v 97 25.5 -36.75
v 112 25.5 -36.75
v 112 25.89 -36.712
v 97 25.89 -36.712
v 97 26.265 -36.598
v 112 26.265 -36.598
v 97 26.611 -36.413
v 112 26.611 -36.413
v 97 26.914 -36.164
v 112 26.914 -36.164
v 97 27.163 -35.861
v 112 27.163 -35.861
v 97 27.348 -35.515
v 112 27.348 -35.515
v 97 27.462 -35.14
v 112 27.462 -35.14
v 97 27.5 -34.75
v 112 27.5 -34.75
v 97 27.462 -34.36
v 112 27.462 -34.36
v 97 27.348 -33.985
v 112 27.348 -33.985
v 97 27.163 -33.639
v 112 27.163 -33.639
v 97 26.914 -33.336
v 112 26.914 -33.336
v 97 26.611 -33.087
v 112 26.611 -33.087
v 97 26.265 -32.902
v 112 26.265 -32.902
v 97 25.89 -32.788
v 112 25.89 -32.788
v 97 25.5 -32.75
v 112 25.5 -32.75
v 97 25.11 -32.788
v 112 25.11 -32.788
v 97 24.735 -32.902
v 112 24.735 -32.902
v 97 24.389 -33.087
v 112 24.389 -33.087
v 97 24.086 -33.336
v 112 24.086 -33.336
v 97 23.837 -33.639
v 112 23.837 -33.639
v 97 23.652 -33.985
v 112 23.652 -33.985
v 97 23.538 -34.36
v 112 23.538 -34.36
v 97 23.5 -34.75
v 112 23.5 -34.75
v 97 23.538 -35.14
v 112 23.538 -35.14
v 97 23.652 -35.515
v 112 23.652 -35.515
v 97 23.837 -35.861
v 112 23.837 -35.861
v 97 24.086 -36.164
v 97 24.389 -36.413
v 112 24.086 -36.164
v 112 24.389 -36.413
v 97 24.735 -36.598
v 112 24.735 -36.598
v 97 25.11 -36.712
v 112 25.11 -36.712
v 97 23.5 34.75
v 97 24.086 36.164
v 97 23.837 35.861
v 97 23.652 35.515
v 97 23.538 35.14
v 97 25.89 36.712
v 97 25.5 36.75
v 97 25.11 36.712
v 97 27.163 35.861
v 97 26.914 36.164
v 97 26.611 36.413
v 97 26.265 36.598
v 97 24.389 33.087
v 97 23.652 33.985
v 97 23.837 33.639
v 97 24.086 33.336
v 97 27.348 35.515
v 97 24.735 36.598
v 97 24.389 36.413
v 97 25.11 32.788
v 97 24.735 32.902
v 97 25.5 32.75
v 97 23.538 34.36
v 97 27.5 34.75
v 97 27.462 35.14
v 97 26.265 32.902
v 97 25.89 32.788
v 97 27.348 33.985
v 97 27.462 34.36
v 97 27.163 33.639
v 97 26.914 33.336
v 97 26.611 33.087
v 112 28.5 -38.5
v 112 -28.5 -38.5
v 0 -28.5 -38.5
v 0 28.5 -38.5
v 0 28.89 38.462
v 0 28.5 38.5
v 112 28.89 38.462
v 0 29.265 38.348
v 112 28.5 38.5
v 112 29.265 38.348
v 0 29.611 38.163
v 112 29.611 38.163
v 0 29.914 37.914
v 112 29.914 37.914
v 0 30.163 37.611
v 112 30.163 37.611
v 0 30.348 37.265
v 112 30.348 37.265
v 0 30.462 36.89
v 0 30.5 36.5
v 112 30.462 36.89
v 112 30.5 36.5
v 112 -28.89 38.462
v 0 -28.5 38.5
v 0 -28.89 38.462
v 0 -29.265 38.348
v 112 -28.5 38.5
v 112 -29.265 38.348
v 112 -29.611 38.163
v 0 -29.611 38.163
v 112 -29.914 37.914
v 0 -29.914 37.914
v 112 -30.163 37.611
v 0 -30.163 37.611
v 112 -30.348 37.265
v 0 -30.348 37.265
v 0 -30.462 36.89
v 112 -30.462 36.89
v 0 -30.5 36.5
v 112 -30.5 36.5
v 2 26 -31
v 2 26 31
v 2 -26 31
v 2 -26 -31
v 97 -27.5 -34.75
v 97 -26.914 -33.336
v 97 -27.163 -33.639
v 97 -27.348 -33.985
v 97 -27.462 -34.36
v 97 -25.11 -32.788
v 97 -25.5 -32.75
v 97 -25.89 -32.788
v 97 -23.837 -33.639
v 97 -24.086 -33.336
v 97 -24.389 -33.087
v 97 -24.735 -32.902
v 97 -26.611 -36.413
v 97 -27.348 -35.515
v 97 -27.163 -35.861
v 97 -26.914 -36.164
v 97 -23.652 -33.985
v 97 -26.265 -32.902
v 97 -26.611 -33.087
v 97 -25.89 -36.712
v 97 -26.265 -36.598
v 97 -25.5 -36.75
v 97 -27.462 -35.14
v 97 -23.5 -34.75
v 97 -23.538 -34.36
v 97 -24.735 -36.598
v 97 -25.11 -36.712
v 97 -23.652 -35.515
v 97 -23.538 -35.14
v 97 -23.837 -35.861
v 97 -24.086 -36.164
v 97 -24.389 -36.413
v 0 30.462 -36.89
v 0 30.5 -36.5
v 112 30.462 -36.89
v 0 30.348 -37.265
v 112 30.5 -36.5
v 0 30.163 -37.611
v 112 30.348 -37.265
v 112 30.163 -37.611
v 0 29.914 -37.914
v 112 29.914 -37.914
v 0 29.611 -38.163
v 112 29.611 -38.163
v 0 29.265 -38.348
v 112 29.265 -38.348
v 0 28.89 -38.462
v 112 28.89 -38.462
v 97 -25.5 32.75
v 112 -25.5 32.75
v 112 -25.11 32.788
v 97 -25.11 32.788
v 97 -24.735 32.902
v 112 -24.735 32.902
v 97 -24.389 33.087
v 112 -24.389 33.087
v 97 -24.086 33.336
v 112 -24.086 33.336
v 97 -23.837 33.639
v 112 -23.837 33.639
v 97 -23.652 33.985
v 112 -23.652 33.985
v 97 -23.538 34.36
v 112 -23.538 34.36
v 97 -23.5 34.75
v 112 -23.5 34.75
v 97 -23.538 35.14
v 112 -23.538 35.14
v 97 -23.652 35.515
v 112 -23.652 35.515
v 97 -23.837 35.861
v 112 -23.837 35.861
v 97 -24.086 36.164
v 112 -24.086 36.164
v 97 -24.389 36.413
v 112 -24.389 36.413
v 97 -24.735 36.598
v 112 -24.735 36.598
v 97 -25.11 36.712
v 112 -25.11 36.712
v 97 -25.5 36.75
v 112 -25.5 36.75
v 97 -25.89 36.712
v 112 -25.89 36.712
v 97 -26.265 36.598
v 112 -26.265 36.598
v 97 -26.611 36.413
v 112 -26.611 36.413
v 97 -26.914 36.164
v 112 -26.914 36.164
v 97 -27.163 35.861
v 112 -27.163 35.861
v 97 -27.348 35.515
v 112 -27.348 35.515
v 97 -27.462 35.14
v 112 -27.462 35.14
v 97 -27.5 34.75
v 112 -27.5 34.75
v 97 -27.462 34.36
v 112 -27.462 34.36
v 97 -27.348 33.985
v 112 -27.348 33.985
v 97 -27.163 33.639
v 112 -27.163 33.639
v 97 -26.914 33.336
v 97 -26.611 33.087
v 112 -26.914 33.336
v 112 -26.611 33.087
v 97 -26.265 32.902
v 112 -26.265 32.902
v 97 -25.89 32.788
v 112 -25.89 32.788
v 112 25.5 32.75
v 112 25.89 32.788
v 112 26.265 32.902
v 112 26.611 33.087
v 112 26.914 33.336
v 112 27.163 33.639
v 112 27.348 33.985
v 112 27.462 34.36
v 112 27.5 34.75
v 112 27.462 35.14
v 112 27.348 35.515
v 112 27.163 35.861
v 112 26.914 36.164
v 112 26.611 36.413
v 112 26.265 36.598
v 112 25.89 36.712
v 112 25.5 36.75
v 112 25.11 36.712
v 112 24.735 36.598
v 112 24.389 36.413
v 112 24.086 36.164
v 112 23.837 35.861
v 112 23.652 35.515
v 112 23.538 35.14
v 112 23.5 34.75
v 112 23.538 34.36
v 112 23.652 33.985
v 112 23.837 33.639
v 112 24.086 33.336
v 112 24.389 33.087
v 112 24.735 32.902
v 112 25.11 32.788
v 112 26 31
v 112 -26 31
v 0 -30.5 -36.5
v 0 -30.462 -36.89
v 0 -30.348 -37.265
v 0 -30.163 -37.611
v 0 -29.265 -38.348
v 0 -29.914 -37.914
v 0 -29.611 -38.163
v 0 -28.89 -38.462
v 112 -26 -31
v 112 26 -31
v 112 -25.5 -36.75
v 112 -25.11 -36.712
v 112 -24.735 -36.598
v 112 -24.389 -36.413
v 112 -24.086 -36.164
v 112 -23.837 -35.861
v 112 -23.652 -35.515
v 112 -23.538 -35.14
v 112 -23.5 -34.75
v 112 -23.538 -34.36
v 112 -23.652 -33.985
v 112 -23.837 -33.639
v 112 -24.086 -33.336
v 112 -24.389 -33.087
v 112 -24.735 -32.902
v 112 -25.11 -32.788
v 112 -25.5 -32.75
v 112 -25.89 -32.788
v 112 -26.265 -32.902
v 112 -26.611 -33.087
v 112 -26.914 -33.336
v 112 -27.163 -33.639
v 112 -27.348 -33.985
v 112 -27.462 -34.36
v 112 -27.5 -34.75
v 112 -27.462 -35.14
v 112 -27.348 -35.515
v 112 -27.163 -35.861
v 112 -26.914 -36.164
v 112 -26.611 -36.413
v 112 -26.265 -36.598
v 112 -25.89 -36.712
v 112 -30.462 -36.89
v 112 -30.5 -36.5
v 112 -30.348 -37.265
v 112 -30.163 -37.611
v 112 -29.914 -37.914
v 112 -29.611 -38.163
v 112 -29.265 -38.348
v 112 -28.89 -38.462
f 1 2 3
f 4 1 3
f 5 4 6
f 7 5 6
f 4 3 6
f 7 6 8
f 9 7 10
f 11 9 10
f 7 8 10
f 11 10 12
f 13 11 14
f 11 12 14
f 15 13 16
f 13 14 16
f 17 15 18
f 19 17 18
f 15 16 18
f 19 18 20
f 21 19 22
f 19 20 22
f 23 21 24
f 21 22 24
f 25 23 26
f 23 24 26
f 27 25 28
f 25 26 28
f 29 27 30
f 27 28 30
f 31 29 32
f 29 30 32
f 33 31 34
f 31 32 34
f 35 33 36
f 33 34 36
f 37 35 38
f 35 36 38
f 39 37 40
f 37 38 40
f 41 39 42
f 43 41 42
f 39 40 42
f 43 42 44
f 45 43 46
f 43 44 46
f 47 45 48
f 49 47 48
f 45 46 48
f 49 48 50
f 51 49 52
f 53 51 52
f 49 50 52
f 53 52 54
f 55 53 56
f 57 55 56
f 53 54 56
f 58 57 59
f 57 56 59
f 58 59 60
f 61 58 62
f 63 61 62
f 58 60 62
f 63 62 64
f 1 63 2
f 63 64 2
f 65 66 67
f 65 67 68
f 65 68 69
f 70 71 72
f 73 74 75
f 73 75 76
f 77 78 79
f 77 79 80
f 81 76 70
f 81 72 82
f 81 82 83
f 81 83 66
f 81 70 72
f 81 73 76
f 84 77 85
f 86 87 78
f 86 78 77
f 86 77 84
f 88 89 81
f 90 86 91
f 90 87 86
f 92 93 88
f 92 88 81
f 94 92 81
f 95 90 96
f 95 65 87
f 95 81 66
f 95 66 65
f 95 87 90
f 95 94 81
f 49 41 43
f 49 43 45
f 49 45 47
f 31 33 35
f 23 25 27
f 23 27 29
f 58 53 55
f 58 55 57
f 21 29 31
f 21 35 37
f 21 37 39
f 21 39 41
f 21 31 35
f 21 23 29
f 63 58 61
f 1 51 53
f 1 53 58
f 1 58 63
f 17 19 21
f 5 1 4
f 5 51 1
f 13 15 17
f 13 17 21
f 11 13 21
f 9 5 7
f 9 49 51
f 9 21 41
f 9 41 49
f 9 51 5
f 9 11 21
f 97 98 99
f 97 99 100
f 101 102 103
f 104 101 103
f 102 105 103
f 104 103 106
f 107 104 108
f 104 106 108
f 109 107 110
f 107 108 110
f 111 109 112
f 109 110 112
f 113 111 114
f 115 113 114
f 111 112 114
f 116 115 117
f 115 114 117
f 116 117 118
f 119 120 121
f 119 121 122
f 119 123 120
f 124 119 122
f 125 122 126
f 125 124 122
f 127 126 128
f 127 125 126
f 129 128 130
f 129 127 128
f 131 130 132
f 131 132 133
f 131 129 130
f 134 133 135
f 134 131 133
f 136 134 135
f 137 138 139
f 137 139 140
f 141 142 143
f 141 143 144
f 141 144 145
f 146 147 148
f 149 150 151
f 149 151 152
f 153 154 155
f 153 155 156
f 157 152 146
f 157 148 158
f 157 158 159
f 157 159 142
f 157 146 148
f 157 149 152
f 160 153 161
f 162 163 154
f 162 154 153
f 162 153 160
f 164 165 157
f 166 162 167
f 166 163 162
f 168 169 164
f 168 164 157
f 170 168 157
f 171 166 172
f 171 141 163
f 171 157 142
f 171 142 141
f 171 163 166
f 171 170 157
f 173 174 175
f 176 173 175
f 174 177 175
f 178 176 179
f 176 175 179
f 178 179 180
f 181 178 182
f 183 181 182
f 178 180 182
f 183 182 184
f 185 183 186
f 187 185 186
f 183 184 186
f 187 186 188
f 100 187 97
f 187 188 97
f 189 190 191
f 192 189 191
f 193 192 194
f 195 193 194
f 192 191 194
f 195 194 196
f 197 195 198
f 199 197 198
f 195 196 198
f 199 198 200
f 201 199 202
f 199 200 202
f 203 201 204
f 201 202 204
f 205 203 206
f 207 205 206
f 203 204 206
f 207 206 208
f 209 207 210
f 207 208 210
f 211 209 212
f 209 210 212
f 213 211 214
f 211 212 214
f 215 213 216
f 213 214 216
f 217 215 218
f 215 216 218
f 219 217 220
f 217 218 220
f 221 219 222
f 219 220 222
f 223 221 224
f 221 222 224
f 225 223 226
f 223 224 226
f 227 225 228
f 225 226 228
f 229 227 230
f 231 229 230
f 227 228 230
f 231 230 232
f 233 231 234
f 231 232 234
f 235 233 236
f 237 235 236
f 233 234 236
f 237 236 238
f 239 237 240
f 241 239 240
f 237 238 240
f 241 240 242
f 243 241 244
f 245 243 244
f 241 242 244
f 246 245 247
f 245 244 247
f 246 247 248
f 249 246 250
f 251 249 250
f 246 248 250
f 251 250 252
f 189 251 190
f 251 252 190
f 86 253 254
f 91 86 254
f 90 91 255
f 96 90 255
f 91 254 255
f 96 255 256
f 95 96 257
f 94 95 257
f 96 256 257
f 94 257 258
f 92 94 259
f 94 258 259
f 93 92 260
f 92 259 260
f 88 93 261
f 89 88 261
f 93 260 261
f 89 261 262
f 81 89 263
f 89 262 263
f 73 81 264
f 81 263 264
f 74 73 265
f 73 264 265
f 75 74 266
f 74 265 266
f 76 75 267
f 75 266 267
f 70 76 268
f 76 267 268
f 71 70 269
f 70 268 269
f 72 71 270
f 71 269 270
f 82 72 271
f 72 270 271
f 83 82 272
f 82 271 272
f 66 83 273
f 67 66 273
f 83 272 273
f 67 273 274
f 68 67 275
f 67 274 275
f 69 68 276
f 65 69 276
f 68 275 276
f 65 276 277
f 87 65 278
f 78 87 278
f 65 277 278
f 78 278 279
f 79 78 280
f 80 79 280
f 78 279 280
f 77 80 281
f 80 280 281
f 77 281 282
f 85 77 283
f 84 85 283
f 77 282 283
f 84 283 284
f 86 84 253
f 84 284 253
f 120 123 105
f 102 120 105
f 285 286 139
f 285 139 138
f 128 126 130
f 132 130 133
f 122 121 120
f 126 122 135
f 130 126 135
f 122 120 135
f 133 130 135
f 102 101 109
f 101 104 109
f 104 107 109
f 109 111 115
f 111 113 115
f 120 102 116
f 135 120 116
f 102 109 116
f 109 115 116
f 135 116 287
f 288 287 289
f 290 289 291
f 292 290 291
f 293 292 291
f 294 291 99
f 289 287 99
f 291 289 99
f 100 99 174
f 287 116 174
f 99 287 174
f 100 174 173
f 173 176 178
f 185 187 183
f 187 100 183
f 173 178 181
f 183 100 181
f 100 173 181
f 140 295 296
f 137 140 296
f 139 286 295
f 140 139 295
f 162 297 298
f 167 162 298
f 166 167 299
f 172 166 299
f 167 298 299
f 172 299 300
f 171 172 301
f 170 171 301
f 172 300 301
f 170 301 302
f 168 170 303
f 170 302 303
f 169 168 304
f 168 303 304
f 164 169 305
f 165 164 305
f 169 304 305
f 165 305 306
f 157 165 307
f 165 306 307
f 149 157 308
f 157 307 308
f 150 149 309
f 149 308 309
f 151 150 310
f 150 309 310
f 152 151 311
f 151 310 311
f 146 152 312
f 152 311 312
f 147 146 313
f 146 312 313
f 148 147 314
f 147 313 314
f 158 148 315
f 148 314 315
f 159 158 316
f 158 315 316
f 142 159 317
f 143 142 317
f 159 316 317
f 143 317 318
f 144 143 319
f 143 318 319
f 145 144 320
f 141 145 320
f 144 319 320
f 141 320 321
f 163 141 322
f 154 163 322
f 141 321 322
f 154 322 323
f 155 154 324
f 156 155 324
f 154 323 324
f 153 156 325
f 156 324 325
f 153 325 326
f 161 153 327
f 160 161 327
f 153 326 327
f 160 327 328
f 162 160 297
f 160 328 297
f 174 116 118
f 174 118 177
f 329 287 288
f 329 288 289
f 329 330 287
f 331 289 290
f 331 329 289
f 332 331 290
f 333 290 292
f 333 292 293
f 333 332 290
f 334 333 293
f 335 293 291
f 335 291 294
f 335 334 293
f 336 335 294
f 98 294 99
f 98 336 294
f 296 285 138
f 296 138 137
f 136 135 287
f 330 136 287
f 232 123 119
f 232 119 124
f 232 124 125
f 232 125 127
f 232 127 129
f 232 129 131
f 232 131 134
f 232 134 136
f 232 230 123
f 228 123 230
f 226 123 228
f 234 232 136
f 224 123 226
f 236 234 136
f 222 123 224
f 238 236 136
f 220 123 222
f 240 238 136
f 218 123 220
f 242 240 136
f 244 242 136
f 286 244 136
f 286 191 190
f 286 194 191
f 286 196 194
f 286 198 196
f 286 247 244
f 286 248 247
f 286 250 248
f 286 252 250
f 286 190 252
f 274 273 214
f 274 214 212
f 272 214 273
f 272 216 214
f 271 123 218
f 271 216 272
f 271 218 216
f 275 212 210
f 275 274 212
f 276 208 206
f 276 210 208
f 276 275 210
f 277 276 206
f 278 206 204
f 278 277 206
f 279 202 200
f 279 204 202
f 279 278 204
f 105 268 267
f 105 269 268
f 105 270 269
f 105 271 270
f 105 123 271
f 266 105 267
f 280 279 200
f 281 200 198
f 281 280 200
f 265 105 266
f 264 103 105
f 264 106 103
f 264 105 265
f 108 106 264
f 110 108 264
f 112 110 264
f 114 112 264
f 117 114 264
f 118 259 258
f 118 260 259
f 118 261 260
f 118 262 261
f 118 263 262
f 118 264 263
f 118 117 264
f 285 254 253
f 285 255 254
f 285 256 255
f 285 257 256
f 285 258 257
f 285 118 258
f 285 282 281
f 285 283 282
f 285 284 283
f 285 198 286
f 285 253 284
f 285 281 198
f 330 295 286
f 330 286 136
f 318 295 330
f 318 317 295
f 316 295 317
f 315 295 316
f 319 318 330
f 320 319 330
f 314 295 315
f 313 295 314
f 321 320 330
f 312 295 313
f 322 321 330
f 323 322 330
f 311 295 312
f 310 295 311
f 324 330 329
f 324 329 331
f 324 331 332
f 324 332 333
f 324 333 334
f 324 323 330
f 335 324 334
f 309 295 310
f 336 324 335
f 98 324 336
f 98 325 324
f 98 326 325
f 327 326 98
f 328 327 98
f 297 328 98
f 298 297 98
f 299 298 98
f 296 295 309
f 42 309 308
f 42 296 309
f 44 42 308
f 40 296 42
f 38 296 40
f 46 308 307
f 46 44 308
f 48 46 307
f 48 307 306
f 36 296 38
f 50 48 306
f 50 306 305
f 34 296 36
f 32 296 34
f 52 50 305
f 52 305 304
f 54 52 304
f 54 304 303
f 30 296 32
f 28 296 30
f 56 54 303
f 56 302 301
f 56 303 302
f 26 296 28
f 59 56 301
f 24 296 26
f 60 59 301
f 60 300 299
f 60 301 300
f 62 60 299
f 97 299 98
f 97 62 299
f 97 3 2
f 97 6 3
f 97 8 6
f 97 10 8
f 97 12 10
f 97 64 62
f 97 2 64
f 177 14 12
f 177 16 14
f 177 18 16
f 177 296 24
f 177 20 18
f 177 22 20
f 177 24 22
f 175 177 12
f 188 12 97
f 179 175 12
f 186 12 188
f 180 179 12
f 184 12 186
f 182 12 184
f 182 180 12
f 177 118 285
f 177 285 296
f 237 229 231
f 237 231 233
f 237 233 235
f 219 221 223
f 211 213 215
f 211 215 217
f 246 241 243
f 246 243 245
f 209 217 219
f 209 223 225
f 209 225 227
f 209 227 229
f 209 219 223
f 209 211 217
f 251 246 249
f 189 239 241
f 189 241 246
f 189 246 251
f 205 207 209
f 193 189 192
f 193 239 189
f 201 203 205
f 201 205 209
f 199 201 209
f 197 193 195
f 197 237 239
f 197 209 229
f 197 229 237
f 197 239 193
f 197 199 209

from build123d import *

# Parameters (mm, degrees)
CROQUIS1_W              = 77
CROQUIS1_H              = 61
SALIENTE_EXTRUIR1_DEPTH = 112
CROQUIS3_W              = 62
CROQUIS3_H              = 52
CORTAR_EXTRUIR4_DEPTH   = 110
CROQUIS10_R             = 2
CORTAR_EXTRUIR5_DEPTH   = 15
REDONDEO1_R             = 2
REDONDEO2_R             = 2


with BuildPart() as part:
    # Croquis1 → Saliente-Extruir1 (new body)
    with BuildSketch(Plane(origin=(0, 0, 0), x_dir=(0, 0, -1), z_dir=(1, 0, 0))):
        Rectangle(CROQUIS1_W, CROQUIS1_H)
    extrude(amount=SALIENTE_EXTRUIR1_DEPTH)

    # Croquis3 → Cortar-Extruir4 (cut)
    with BuildSketch(Plane(origin=(112, 0, 0), x_dir=(0, 0, -1), z_dir=(1, 0, 0))):
        Rectangle(CROQUIS3_W, CROQUIS3_H)
    extrude(amount=-CORTAR_EXTRUIR4_DEPTH, mode=Mode.SUBTRACT)

    # Croquis10 → Cortar-Extruir5 (cut)
    with BuildSketch(Plane(origin=(112, 0, 0), x_dir=(0, 0, -1), z_dir=(1, 0, 0))):
        with Locations((-34.75, 25.5)):
            Circle(CROQUIS10_R)
        with Locations((34.75, 25.5)):
            Circle(CROQUIS10_R)
        with Locations((34.75, -25.5)):
            Circle(CROQUIS10_R)
        with Locations((-34.75, -25.5)):
            Circle(CROQUIS10_R)
    extrude(amount=-CORTAR_EXTRUIR5_DEPTH, mode=Mode.SUBTRACT)

    # Redondeo1
    redondeo1_edges = [part.edges().sort_by_distance(p)[0] for p in [
        (56, 30.5, 38.5),
    ]]
    fillet(redondeo1_edges, radius=REDONDEO1_R)

    # Redondeo2
    redondeo2_edges = [part.edges().sort_by_distance(p)[0] for p in [
        (56, -30.5, -38.5),
        (56, -30.5, 38.5),
        (56, 30.5, -38.5),
    ]]
    fillet(redondeo2_edges, radius=REDONDEO2_R)


solid = part.part
